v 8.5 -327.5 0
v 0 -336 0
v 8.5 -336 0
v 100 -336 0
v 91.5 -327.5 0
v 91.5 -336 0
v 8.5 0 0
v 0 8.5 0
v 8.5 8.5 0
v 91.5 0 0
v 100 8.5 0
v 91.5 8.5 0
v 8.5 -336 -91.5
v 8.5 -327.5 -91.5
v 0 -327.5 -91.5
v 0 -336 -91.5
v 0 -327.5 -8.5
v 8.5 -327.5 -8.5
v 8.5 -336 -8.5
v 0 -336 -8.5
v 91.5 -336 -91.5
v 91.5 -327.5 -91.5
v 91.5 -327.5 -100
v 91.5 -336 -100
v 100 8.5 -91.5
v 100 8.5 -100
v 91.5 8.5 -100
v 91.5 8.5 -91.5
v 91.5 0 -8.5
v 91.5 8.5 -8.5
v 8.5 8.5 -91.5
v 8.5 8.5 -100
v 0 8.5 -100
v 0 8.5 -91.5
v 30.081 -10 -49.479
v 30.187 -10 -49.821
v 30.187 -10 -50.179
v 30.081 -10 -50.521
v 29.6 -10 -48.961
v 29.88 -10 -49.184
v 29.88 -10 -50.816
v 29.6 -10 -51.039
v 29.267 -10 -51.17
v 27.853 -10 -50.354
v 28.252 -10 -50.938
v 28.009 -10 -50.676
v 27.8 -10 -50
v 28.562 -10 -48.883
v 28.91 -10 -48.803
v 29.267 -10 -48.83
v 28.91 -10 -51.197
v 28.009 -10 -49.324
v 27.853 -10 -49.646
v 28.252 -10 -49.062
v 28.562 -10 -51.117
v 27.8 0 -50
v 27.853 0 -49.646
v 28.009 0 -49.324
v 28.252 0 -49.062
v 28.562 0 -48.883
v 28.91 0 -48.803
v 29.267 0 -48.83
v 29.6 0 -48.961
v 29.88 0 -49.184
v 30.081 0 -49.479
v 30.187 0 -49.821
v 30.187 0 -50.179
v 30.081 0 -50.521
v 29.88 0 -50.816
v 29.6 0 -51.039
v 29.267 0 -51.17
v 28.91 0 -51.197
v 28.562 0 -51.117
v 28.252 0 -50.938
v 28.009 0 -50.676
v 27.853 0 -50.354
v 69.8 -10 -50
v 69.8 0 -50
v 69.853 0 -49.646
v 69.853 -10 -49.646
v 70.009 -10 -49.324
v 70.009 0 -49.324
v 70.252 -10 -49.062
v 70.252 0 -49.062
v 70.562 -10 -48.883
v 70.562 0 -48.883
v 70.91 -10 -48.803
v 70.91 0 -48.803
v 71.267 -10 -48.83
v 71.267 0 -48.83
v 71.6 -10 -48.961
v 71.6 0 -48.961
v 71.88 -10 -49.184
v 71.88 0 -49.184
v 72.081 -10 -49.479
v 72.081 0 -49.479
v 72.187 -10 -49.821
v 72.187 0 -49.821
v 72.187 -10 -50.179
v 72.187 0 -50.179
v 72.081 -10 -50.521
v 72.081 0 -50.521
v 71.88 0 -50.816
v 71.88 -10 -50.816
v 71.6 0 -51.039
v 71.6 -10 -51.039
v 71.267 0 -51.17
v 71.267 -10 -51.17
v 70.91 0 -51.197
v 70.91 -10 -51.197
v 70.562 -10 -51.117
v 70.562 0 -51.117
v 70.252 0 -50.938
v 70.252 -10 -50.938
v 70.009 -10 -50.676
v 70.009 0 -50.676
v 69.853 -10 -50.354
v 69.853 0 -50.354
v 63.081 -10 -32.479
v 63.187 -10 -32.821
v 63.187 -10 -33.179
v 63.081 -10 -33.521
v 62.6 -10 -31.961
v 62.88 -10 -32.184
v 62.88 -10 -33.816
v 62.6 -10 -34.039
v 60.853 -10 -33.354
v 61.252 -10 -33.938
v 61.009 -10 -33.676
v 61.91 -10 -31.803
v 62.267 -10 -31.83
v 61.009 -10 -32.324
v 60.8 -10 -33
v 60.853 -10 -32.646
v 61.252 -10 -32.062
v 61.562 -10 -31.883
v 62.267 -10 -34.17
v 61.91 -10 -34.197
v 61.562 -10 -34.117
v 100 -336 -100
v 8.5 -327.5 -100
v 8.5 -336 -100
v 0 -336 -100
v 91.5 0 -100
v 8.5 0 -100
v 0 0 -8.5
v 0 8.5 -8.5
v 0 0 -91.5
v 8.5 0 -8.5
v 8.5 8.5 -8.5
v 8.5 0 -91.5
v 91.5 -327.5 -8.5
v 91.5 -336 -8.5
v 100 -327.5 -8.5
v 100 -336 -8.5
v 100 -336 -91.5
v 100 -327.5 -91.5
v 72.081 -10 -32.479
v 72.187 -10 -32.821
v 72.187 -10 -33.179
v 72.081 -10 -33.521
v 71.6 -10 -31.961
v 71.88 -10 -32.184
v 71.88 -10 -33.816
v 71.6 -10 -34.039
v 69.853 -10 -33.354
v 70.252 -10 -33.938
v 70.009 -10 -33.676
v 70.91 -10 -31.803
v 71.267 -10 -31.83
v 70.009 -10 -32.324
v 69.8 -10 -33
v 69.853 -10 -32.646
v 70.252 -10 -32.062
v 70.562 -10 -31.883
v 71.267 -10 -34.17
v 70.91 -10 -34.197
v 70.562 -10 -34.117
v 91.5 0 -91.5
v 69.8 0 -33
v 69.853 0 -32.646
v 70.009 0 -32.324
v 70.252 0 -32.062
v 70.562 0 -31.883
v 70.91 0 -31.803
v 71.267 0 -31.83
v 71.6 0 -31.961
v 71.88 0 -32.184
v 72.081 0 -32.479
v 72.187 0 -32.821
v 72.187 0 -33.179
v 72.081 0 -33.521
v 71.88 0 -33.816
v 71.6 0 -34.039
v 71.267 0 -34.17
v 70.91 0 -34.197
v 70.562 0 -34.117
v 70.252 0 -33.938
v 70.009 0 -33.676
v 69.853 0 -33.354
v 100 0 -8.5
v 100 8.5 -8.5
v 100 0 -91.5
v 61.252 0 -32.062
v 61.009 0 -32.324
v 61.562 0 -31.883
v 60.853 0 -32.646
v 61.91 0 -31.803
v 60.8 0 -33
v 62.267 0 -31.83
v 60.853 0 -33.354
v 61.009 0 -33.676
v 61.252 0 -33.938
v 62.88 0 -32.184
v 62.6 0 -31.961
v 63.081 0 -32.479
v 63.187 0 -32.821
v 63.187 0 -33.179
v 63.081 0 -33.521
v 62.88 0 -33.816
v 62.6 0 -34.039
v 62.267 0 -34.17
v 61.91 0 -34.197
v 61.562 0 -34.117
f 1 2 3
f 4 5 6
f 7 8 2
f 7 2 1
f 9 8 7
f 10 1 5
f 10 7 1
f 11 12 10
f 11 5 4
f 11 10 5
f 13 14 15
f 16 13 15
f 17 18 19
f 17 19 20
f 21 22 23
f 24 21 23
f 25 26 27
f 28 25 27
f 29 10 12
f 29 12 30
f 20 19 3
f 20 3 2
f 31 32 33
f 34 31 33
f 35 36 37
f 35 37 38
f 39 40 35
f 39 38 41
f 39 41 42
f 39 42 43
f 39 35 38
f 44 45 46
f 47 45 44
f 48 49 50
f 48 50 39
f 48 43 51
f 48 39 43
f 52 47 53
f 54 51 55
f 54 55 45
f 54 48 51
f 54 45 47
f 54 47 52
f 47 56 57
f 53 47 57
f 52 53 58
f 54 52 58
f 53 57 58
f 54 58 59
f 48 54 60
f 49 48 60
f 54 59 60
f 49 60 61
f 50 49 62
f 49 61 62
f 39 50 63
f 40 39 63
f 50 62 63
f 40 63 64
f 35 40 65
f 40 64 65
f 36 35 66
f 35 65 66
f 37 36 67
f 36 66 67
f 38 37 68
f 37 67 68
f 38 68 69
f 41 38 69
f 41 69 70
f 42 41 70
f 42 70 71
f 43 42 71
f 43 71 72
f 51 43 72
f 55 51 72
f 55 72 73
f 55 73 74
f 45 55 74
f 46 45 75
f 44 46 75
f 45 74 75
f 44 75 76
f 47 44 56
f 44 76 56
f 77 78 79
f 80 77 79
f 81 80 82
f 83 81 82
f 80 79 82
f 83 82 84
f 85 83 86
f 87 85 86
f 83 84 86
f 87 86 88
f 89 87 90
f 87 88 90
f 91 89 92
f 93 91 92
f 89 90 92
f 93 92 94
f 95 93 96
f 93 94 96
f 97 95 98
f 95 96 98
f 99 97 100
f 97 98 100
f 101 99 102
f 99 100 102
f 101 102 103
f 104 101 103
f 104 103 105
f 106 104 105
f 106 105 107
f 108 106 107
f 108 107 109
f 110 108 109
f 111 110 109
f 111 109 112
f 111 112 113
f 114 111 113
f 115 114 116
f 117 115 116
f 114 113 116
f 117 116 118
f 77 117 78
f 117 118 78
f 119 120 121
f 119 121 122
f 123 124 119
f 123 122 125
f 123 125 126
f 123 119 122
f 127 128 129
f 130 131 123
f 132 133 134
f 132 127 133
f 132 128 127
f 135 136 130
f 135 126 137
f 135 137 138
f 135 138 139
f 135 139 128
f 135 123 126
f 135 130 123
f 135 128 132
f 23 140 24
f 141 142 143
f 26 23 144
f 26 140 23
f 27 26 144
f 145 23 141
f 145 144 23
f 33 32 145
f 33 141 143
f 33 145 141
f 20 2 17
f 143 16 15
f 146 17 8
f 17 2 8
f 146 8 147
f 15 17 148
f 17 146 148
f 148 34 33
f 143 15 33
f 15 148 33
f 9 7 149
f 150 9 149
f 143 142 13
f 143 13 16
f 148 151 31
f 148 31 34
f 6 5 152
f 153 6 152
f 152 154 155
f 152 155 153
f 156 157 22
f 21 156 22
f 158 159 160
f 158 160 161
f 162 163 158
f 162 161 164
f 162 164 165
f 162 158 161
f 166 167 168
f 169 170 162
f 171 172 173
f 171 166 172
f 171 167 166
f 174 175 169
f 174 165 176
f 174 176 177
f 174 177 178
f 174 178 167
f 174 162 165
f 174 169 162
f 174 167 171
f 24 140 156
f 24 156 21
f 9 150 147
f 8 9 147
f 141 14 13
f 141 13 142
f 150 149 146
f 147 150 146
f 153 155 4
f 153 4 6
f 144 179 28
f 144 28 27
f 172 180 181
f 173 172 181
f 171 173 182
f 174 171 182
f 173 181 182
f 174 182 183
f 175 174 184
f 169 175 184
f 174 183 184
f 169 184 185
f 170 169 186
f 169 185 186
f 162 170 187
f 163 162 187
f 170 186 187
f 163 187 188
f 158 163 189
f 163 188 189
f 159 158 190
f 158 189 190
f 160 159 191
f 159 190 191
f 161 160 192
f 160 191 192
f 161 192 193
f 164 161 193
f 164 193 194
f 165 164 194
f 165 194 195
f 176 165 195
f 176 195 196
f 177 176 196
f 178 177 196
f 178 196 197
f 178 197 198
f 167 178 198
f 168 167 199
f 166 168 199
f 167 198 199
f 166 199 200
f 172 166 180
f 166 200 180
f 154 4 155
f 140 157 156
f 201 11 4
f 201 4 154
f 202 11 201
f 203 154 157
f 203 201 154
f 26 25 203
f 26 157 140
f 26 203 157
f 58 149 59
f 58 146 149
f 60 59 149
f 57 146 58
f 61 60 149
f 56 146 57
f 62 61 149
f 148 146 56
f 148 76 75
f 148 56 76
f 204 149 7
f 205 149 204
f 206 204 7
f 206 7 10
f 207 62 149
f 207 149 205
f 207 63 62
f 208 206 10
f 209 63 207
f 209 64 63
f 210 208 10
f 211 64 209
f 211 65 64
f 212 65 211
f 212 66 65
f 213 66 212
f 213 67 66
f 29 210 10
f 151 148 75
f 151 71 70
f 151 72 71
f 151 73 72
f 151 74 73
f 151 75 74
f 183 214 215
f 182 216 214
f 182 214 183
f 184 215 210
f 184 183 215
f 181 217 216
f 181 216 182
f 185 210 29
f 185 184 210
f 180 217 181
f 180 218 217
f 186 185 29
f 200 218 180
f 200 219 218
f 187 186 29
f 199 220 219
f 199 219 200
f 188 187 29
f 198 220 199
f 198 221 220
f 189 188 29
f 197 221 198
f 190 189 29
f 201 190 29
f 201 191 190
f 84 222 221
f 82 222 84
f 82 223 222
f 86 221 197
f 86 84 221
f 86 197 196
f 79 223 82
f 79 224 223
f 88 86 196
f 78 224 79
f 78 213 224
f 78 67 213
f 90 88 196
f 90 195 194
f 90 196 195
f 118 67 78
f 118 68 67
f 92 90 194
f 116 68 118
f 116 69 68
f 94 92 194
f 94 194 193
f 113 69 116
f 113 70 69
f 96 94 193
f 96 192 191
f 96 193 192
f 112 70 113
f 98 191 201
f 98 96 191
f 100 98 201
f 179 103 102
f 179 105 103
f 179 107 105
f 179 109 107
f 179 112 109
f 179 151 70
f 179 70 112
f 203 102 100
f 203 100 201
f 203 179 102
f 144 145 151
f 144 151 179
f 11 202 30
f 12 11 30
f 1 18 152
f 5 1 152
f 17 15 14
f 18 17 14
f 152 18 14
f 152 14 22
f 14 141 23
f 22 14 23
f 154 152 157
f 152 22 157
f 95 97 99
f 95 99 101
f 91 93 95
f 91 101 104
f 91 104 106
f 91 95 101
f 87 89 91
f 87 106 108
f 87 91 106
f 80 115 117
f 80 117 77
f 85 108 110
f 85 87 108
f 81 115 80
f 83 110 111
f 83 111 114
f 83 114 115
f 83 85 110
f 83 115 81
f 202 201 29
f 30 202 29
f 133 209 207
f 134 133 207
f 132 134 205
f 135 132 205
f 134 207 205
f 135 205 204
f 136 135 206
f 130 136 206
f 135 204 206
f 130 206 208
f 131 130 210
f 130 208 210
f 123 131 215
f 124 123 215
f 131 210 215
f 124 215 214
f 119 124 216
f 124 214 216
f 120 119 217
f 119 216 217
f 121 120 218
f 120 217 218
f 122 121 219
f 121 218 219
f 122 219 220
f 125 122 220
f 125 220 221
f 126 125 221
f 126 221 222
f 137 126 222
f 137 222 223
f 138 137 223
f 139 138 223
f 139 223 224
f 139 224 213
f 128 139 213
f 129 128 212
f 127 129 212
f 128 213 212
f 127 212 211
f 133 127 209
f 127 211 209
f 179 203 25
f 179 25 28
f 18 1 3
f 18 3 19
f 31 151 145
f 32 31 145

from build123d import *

# Parameters (mm, degrees)
BOSS_EXTRUDE1_DEPTH      = 327.5
SKETCH30_R               = 1.2
CUT_EXTRUDE4_DEPTH       = 10
SKETCH31_W               = 8.5
SKETCH31_H               = 8.5
BOSS_EXTRUDE2_DEPTH      = 8.5
BOSS_EXTRUDE2_DEPTH_BACK = 336


with BuildPart() as part:
    # Sketch1 → Boss-Extrude1 (new body)
    with BuildSketch(Plane(origin=(0, 0, 0), x_dir=(1, 0, 0), z_dir=(0, 1, 0))):
        Polygon((0, 17), (0, 0), (17, 0), (83, 0), (100, 0), (100, 17), (100, 83), (100, 100), (83, 100), (17, 100), (0, 100), (0, 83), align=None)
    extrude(amount=-BOSS_EXTRUDE1_DEPTH)

    # Sketch30 → Cut-Extrude4 (cut)
    with BuildSketch(Plane(origin=(0, 0, 0), x_dir=(-1, 0, 0), z_dir=(0, 1, 0))):
        with Locations((-71, -50)):
            Circle(SKETCH30_R)
        with Locations((-29, -50)):
            Circle(SKETCH30_R)
        with Locations((-62, -33)):
            Circle(SKETCH30_R)
        with Locations((-71, -33)):
            Circle(SKETCH30_R)
    extrude(amount=-CUT_EXTRUDE4_DEPTH, mode=Mode.SUBTRACT)

    # Sketch31 → Boss-Extrude2 (add, two sides)
    with BuildSketch(Plane(origin=(0, -327.5, 0), x_dir=(-1, 0, 0), z_dir=(0, -1, 0))) as boss_extrude2_sk:
        with Locations((-4.25, 95.75)):
            Rectangle(SKETCH31_W, SKETCH31_H)
        with Locations((-95.75, 95.75)):
            Rectangle(SKETCH31_W, SKETCH31_H)
        with Locations((-4.25, 4.25)):
            Rectangle(SKETCH31_W, SKETCH31_H)
        with Locations((-95.75, 4.25)):
            Rectangle(SKETCH31_W, SKETCH31_H)
    extrude(amount=BOSS_EXTRUDE2_DEPTH)
    extrude(boss_extrude2_sk.sketch, amount=-BOSS_EXTRUDE2_DEPTH_BACK)


solid = part.part
